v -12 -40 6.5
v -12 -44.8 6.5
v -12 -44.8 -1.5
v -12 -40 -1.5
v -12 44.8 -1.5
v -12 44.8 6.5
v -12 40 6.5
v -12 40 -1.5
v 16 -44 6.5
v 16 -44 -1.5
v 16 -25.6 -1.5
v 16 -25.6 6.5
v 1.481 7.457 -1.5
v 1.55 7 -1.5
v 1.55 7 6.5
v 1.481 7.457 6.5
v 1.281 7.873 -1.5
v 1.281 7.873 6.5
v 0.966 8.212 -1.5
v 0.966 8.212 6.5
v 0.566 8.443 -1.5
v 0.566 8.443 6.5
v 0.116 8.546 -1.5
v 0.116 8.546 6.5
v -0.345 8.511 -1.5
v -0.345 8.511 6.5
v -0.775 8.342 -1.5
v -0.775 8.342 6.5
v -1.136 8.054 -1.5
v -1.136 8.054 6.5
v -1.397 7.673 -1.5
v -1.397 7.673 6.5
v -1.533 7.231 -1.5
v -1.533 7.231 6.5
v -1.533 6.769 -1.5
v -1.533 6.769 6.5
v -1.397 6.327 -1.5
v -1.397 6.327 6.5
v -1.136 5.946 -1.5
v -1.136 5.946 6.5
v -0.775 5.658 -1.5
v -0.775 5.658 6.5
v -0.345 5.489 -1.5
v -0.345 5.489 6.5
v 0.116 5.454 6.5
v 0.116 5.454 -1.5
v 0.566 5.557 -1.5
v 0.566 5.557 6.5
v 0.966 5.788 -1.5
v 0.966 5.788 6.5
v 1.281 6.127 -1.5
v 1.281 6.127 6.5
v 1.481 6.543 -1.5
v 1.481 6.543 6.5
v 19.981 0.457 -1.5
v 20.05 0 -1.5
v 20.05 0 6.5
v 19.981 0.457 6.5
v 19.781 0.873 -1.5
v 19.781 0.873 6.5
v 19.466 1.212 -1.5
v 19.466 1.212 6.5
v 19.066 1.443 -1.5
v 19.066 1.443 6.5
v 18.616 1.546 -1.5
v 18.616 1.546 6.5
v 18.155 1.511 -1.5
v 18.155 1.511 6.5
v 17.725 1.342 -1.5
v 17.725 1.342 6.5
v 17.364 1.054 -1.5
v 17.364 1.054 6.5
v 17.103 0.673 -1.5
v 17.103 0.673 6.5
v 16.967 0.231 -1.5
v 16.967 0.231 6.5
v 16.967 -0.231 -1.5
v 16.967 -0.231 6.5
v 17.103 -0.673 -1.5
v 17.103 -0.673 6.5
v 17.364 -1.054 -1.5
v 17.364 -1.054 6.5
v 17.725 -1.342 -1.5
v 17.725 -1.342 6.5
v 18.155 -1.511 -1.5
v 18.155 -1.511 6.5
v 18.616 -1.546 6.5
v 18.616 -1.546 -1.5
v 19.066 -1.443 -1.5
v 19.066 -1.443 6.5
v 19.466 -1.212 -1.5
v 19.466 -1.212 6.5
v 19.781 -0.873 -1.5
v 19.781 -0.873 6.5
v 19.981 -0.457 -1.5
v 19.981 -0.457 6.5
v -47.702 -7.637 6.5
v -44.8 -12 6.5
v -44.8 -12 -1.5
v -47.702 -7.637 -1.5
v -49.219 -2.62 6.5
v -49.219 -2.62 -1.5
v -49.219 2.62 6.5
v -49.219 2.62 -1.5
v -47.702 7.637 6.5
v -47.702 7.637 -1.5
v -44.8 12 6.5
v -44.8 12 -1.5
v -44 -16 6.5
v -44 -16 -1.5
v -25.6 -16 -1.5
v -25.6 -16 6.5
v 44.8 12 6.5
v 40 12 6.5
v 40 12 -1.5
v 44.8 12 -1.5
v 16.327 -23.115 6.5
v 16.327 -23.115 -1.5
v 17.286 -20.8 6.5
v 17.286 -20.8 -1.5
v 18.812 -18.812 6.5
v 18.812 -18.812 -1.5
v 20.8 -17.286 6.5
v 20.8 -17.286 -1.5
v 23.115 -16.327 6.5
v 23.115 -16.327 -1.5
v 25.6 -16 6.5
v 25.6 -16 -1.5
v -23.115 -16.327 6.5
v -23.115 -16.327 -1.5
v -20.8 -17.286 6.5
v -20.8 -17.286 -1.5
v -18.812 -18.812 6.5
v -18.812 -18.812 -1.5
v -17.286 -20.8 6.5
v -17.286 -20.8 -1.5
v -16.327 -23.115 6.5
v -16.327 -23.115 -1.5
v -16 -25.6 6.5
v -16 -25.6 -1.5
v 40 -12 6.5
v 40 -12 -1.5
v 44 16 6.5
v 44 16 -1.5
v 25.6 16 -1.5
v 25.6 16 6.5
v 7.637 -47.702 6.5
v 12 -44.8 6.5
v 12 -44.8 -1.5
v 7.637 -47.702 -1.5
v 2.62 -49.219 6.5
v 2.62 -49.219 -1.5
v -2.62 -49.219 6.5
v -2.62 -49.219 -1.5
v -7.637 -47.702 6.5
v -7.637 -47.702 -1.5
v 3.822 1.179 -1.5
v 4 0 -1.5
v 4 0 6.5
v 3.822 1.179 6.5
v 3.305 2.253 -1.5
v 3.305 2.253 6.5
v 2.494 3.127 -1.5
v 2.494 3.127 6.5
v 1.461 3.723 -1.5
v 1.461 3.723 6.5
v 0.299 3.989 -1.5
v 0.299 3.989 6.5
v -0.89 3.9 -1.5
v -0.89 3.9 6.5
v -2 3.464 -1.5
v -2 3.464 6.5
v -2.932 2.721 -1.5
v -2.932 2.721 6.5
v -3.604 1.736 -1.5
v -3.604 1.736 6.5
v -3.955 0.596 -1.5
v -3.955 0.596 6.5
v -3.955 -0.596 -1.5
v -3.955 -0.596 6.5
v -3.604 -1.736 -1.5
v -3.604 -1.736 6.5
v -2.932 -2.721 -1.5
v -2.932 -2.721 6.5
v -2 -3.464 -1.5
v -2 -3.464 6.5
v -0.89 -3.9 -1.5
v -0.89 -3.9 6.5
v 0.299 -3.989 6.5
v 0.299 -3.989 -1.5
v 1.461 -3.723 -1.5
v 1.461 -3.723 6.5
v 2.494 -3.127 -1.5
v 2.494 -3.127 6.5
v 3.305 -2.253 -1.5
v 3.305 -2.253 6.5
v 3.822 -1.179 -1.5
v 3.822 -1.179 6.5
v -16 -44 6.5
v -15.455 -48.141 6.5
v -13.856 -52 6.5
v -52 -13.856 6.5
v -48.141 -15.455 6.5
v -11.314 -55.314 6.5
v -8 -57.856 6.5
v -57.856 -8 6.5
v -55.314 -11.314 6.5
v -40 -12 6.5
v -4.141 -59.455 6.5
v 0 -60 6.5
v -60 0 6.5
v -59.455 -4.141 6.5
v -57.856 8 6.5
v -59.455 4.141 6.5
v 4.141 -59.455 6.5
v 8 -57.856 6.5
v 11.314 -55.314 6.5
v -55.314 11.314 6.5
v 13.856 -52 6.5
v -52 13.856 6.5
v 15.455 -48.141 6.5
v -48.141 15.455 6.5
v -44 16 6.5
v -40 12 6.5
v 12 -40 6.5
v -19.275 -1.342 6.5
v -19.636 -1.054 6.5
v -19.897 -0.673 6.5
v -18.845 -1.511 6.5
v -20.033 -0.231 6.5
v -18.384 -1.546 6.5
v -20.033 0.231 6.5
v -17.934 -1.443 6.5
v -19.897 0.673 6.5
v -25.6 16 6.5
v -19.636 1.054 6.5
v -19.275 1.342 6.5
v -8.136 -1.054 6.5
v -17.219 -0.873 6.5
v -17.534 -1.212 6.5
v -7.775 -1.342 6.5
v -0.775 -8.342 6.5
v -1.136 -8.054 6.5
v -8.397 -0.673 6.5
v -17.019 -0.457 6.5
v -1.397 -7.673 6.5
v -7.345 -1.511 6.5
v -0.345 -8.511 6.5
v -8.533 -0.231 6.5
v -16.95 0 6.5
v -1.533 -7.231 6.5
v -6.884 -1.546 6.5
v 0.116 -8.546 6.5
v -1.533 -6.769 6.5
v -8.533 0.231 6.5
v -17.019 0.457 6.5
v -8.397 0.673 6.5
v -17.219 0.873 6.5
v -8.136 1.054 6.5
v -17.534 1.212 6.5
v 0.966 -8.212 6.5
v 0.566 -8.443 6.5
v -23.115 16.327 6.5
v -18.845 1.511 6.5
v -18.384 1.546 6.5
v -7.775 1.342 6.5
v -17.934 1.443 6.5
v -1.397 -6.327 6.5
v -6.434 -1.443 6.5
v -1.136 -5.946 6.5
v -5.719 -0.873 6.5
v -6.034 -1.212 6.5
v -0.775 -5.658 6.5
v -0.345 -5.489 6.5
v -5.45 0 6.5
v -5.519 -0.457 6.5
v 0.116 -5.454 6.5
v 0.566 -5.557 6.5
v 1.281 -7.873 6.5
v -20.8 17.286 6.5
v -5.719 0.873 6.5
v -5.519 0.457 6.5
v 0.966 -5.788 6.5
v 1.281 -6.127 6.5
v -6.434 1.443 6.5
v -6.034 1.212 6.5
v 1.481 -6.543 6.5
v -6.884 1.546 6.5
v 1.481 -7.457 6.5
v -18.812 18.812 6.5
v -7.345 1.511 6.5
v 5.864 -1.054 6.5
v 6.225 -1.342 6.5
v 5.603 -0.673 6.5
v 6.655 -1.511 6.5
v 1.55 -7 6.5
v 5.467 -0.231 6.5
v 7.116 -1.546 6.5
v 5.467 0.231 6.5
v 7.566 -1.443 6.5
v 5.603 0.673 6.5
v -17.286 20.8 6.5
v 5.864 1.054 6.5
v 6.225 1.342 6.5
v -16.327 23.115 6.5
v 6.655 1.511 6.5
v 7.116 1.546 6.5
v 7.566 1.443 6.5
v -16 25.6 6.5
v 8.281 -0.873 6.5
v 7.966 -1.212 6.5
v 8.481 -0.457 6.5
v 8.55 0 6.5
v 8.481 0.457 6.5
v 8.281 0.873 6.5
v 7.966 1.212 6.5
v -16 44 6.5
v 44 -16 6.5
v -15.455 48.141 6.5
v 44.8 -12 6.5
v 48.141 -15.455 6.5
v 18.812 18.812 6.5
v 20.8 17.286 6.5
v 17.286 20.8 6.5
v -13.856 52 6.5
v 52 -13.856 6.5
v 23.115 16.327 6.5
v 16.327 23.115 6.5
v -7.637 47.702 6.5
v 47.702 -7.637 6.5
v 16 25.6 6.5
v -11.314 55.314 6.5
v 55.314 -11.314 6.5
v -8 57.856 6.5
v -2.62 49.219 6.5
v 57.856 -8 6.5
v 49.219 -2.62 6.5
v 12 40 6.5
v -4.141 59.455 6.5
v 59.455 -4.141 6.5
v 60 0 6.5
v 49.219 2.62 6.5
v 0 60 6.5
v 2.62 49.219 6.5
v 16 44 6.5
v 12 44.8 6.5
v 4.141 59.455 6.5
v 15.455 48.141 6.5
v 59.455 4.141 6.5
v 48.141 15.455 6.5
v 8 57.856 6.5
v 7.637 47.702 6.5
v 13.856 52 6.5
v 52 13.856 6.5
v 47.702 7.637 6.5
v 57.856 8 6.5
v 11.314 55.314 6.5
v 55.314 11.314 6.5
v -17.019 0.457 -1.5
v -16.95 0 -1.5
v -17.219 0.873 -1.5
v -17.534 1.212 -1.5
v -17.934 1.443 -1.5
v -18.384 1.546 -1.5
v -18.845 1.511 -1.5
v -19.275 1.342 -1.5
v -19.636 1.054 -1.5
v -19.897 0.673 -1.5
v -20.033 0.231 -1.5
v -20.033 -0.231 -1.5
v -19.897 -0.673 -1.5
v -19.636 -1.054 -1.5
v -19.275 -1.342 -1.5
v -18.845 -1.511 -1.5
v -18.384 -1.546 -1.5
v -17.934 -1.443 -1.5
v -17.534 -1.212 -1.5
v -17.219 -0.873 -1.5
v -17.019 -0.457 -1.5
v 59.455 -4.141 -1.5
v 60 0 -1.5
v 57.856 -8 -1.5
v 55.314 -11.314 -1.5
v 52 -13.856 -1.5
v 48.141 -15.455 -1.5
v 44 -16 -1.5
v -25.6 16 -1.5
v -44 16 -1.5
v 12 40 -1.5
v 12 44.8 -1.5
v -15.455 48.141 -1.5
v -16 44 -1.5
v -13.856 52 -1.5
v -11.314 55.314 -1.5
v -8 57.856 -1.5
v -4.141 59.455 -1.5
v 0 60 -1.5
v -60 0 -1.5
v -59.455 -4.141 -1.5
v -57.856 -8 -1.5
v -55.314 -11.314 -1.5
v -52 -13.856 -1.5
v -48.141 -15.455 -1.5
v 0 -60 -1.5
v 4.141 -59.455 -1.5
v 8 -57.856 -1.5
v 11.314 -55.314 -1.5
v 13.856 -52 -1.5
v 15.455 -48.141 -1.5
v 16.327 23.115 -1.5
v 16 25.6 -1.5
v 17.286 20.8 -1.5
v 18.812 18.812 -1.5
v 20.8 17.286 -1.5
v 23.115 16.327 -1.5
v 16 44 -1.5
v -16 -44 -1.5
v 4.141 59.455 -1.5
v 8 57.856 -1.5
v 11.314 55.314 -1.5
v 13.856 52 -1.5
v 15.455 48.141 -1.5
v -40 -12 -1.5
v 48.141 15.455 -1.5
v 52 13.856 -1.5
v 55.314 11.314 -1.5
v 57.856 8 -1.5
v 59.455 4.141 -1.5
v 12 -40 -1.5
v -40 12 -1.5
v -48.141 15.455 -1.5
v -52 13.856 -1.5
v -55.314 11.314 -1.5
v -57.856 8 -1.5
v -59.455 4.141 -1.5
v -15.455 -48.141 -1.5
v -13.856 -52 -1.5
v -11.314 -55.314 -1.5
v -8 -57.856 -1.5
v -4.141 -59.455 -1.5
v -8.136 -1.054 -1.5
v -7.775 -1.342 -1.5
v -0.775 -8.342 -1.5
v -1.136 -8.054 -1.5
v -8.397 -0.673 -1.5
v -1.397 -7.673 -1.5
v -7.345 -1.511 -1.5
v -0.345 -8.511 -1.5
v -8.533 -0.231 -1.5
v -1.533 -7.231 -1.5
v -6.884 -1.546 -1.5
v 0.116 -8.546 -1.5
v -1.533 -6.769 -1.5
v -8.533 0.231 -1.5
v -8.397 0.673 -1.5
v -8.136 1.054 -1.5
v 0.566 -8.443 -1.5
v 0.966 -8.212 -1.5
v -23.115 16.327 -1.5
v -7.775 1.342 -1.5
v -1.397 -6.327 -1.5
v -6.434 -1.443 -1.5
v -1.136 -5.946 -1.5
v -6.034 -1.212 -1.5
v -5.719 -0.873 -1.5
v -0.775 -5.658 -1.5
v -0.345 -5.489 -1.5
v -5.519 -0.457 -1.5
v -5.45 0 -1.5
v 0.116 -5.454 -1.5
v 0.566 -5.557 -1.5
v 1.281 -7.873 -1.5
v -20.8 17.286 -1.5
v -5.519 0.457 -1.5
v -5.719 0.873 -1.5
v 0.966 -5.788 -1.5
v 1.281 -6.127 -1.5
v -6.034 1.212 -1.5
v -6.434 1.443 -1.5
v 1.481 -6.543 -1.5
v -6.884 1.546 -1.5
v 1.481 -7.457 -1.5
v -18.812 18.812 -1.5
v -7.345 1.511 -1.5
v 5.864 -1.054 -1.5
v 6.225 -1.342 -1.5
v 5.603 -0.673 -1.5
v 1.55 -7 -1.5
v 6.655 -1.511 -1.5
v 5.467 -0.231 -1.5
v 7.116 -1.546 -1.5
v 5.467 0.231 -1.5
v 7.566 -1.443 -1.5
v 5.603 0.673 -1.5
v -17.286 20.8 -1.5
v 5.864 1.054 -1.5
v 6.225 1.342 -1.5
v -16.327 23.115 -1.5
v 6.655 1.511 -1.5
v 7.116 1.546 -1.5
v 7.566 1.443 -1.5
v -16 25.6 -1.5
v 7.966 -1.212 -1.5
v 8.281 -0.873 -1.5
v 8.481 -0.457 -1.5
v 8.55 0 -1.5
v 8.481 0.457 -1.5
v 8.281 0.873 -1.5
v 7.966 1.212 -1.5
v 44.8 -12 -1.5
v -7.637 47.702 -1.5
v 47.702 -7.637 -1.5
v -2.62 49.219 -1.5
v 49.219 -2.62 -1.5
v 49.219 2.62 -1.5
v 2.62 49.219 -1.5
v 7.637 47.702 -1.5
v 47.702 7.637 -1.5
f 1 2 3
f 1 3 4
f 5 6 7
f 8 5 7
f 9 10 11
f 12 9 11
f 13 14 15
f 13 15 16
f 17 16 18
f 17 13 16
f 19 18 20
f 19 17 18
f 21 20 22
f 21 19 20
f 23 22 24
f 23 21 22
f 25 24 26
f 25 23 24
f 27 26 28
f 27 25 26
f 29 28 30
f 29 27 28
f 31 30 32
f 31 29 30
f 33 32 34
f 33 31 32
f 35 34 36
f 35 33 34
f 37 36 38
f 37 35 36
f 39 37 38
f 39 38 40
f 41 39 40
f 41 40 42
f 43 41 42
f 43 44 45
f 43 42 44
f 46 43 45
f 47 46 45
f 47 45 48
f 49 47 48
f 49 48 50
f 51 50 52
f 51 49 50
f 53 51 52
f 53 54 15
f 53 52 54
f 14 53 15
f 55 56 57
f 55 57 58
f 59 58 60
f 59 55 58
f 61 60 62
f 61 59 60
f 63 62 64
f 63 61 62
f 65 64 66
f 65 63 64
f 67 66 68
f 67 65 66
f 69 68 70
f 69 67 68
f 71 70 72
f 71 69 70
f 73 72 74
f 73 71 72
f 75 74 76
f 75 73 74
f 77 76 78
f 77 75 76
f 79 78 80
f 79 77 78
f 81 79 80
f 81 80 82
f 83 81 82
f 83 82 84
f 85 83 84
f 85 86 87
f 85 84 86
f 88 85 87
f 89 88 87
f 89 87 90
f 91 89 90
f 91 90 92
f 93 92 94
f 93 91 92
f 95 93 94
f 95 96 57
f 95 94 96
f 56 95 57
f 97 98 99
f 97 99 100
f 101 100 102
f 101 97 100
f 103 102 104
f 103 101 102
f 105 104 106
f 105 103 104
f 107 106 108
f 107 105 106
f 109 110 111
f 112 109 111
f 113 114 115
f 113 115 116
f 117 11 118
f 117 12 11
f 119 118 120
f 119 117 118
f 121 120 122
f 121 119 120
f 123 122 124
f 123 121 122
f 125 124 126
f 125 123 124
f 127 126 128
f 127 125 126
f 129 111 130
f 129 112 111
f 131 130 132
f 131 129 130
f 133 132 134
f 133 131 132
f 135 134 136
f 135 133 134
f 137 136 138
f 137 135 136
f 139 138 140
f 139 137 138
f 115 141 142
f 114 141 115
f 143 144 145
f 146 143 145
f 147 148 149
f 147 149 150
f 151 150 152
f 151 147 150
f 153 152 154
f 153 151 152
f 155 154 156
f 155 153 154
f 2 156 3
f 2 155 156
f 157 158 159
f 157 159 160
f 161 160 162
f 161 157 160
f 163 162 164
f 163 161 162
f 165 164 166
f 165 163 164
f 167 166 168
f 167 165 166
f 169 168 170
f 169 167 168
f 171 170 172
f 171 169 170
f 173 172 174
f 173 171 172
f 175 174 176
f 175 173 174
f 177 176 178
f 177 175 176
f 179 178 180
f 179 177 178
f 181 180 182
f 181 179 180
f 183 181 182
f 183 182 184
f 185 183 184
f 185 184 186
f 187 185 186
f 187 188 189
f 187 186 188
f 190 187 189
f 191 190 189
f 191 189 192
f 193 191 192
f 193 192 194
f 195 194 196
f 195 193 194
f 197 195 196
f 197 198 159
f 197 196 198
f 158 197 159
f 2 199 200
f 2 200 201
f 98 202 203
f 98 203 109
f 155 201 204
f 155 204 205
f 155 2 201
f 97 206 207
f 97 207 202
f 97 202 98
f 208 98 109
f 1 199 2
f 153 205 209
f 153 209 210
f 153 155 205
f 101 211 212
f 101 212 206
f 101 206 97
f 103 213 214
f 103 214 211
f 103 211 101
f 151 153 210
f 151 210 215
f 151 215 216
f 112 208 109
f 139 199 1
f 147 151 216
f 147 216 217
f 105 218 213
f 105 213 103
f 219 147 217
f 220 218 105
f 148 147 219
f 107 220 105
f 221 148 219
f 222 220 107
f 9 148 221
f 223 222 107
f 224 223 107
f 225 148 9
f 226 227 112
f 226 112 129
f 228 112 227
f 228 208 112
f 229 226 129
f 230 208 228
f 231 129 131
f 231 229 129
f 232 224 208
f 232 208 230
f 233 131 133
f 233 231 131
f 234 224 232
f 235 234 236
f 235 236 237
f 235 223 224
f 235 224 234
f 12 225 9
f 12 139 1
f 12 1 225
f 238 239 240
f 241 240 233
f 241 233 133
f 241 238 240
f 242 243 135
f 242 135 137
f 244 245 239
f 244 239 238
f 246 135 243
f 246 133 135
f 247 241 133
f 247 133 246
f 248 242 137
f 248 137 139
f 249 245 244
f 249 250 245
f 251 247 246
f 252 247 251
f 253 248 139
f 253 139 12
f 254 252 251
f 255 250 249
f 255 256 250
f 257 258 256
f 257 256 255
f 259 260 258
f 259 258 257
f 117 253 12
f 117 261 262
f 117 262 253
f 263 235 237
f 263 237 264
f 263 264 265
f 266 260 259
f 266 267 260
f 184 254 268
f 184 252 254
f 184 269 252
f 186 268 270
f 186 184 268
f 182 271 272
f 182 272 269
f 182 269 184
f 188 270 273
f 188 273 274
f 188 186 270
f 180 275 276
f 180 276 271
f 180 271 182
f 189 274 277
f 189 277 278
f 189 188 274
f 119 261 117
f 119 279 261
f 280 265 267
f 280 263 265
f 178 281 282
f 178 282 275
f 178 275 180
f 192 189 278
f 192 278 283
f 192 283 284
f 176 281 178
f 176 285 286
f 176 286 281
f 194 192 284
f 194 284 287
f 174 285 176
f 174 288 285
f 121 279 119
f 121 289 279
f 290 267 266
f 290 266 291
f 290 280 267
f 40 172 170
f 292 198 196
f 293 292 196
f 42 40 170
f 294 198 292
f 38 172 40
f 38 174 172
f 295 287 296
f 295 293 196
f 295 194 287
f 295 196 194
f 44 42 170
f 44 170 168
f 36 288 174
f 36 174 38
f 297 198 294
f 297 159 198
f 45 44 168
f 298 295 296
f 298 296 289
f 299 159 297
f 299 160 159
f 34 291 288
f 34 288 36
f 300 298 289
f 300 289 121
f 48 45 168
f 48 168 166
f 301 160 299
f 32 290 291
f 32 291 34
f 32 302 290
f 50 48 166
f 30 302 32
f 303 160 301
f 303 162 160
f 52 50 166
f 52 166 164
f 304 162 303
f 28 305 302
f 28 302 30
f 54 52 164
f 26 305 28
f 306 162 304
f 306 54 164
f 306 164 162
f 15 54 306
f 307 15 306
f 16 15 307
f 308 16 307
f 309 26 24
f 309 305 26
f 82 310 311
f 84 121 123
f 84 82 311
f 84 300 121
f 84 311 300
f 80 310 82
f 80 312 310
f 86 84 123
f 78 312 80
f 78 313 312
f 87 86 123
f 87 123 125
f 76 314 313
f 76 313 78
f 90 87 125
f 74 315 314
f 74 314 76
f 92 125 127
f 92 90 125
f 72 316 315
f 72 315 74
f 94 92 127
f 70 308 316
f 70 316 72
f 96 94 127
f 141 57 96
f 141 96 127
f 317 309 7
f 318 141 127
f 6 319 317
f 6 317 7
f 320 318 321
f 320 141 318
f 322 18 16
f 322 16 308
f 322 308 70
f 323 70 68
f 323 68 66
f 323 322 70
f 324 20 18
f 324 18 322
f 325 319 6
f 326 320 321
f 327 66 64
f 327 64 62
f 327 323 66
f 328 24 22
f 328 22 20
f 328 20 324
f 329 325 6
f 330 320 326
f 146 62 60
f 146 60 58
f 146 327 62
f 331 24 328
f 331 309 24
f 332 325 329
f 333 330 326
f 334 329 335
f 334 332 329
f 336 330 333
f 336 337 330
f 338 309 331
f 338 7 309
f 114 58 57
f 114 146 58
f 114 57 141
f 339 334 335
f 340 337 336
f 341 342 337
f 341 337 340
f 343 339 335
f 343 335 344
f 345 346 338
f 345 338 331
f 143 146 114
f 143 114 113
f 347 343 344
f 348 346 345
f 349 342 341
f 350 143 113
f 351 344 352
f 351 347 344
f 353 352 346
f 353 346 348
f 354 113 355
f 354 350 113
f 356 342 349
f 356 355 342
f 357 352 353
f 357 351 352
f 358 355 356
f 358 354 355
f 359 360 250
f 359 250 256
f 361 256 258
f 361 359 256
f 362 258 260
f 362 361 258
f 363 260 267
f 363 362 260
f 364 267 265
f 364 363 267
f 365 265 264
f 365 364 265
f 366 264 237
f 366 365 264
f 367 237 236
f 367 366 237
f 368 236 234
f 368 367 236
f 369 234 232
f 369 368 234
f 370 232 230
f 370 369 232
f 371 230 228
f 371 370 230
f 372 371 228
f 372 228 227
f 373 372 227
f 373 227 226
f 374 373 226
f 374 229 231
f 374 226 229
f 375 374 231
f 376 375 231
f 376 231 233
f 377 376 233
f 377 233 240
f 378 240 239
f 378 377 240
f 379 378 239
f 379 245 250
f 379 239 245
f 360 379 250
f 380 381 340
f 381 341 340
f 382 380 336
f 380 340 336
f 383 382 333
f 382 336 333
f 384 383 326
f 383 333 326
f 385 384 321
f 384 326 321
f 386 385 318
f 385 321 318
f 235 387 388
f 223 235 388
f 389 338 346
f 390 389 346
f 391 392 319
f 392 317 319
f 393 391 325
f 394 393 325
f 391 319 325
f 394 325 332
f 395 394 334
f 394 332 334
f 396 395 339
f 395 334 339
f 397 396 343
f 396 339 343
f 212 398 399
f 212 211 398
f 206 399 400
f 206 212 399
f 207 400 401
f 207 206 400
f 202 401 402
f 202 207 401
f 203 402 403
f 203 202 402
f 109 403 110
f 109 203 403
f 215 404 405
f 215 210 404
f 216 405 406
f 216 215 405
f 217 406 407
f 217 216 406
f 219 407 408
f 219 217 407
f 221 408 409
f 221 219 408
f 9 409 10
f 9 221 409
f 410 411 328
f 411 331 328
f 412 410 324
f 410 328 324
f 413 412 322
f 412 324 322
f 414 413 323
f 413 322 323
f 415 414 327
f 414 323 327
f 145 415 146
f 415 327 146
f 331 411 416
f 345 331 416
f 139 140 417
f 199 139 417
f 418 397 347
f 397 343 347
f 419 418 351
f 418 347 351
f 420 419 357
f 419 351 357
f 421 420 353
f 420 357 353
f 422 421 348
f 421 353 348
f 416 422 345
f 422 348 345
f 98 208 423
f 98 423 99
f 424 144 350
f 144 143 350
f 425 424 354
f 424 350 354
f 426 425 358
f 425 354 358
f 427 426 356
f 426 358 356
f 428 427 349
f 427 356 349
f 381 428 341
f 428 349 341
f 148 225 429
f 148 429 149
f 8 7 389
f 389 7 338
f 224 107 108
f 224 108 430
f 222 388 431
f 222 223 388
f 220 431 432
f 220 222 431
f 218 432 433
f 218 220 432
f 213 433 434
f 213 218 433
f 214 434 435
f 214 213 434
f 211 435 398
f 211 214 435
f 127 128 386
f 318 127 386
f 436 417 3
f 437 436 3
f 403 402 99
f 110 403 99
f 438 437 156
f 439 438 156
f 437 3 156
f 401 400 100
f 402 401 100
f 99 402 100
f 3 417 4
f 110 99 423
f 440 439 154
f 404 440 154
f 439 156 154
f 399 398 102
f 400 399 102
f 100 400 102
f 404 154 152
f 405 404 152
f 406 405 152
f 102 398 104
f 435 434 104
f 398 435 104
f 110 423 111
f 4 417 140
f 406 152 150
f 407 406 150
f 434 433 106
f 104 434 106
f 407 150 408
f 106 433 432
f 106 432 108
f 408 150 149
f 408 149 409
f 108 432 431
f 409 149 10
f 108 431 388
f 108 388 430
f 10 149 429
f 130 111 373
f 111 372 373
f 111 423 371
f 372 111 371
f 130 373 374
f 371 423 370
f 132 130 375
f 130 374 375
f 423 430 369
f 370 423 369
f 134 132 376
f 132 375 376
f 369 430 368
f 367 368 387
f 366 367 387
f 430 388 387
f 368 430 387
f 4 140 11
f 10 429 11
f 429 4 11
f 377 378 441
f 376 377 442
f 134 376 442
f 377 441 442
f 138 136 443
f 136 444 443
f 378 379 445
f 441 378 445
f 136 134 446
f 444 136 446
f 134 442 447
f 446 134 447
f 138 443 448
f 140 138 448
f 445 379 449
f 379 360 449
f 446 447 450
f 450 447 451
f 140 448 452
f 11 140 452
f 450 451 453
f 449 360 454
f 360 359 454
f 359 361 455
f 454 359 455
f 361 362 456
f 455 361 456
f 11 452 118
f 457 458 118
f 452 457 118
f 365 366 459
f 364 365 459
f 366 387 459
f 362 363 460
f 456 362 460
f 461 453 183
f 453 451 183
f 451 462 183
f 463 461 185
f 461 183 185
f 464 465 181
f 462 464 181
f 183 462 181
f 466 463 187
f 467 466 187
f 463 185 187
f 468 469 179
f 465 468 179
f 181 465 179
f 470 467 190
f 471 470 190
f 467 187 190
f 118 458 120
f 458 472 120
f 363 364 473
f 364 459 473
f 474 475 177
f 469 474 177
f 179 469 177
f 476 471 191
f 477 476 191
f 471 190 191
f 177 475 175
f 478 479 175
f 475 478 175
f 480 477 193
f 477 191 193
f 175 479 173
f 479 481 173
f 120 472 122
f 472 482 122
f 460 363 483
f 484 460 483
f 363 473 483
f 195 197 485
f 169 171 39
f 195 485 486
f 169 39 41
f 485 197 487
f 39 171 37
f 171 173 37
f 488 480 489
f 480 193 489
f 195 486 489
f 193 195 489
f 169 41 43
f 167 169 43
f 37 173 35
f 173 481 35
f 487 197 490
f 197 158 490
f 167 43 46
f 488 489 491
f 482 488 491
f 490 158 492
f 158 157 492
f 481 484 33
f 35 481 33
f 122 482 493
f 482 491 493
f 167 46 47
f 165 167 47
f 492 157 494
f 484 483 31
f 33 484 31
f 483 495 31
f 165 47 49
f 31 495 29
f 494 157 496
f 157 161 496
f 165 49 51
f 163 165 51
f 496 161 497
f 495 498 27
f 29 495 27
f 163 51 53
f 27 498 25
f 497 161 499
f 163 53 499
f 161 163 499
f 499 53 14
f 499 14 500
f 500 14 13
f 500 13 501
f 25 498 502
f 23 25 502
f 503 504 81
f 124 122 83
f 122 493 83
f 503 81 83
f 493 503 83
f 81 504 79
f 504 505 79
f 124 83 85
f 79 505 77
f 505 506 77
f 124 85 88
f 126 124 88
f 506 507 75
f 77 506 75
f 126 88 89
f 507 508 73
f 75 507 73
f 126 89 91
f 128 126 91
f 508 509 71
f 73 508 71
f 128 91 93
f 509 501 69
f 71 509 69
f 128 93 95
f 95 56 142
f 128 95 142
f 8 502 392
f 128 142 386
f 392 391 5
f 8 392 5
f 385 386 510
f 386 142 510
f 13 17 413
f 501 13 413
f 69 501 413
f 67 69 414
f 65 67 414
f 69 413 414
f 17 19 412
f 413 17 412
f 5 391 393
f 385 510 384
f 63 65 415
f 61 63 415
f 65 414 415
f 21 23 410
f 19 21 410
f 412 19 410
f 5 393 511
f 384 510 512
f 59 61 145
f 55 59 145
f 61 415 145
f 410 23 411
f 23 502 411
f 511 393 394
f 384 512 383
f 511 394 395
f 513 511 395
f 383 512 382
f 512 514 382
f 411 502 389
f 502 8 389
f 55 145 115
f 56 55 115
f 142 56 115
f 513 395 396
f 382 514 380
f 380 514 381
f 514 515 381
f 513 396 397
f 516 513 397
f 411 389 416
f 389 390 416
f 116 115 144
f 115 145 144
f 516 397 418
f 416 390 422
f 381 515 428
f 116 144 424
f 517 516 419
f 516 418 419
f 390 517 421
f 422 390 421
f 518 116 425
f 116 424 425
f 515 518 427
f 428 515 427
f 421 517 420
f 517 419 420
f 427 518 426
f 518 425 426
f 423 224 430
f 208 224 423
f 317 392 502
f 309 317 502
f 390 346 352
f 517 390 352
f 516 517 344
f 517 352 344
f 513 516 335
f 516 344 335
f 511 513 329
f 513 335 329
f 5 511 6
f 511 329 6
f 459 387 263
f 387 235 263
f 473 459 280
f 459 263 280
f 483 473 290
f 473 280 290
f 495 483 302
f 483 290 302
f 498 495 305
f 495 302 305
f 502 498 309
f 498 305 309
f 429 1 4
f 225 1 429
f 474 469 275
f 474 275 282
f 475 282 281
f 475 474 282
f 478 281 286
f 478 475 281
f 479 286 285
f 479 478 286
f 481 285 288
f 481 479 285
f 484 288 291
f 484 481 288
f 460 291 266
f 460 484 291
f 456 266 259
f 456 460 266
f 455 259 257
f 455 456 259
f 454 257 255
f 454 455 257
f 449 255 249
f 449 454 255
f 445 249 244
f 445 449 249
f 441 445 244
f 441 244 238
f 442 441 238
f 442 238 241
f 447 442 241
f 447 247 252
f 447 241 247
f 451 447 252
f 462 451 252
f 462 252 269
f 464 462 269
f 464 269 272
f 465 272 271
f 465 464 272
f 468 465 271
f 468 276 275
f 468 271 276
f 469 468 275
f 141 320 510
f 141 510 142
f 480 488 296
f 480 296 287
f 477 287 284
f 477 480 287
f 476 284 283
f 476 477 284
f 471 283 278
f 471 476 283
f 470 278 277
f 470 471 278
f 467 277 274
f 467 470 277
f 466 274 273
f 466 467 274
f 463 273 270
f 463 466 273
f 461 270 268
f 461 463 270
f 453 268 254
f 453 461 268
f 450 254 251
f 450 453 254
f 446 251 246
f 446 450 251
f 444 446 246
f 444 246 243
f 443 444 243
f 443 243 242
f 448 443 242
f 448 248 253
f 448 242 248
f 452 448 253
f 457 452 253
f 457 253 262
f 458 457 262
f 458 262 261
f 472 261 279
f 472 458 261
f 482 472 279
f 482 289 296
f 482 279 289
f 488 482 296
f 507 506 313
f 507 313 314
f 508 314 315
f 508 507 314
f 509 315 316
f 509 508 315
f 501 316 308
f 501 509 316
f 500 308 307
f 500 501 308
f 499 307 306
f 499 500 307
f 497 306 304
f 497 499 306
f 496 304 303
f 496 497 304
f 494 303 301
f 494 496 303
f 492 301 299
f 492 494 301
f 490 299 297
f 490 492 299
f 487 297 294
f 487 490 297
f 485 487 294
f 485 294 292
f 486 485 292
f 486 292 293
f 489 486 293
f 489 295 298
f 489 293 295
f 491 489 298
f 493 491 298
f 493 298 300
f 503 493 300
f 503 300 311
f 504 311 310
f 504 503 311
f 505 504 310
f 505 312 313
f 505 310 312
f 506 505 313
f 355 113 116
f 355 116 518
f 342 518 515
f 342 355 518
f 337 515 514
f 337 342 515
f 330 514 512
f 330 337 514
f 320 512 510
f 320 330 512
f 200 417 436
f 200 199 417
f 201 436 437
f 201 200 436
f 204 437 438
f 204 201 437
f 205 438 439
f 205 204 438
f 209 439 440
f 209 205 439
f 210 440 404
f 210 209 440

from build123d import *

# Parameters (mm, degrees)
EXTRUDE_1_DEPTH          = 5
CUT_EXTRUDE_1_DEPTH      = 54.268189382
FILLET_1_R               = 10
FILLET_2_R               = 6
SCALE_1_SCALE            = 1.6
CUT_EXTRUDE_2_DEPTH      = 86.229103011
CUT_EXTRUDE_2_DEPTH_BACK = 86.229103011
SKETCH_3_R               = 4
SKETCH_3_R_2             = 1.55


with BuildPart() as part:
    # 草图1 → 凸台-拉伸1 (new body)
    with BuildSketch(Plane.XY):
        Polygon((-10, 32.5), (-10, 10), (-37.5, 10), (-37.5, -10), (-10, -10), (-10, -37.5), (10, -37.5), (10, -10), (37.5, -10), (37.5, 10), (10, 10), (10, 32.5), (10, 37.5), (0, 37.5), (-10, 37.5), align=None)
    extrude(amount=EXTRUDE_1_DEPTH)

    # 草图2 → 切除-拉伸1 (cut, through all)
    with BuildSketch(Plane.XY.offset(5)):
        with BuildLine():
            Line((7.5, 25), (7.5, 28))
            ThreePointArc((7.5, 28), (0, 30.881947343), (-7.5, 28))
            Line((-7.5, 28), (-7.5, 25))
            Line((-7.5, 25), (7.5, 25))
        make_face()
        with BuildLine():
            ThreePointArc((-28, -7.5), (-30.881947343, 0), (-28, 7.5))
            Line((-28, 7.5), (-25, 7.5))
            Line((-25, 7.5), (-25, -7.5))
            Line((-25, -7.5), (-28, -7.5))
        make_face()
        with BuildLine():
            ThreePointArc((7.5, -28), (0, -30.881947343), (-7.5, -28))
            Line((-7.5, -28), (-7.5, -25))
            Line((-7.5, -25), (7.5, -25))
            Line((7.5, -25), (7.5, -28))
        make_face()
        with BuildLine():
            ThreePointArc((28, 7.5), (30.881947343, 0), (28, -7.5))
            Line((28, -7.5), (25, -7.5))
            Line((25, -7.5), (25, 7.5))
            Line((25, 7.5), (28, 7.5))
        make_face()
    extrude(amount=-CUT_EXTRUDE_1_DEPTH, mode=Mode.SUBTRACT)

    # 圆角1
    fillet_1_edges = [part.edges().sort_by_distance(p)[0] for p in [
        (-37.5, 10, 2.5),
        (-37.5, -10, 2.5),
        (-10, -37.5, 2.5),
        (10, -37.5, 2.5),
        (37.5, -10, 2.5),
        (37.5, 10, 2.5),
        (10, 37.5, 2.5),
        (-10, 37.5, 2.5),
    ]]
    fillet(fillet_1_edges, radius=FILLET_1_R - 0.0001)  # a hair under: the kernel refuses the full size

    # 圆角2
    fillet_2_edges = [part.edges().sort_by_distance(p)[0] for p in [
        (10, 10, 2.5),
        (10, -10, 2.5),
        (-10, -10, 2.5),
        (-10, 10, 2.5),
    ]]
    fillet(fillet_2_edges, radius=FILLET_2_R)


with BuildPart() as part_1:
    # 缩放比例1: scaled about (0, 0, 2.5)
    add(part.part.scale(SCALE_1_SCALE).moved(Location((0, 0, -1.5))))

    # 草图3 → 切除-拉伸2 (cut, two sides: drawn at the far end of the back side and taken through both)
    with BuildSketch(Plane.XY.offset(6.5).offset(-CUT_EXTRUDE_2_DEPTH_BACK)):
        Circle(SKETCH_3_R)
        with Locations((-7, 0)):
            Circle(SKETCH_3_R_2)
        with Locations((7, 0)):
            Circle(SKETCH_3_R_2)
        with Locations((0, 7)):
            Circle(SKETCH_3_R_2)
        with Locations((0, -7)):
            Circle(SKETCH_3_R_2)
        with Locations((-18.5, 0)):
            Circle(SKETCH_3_R_2)
        with Locations((18.5, 0)):
            Circle(SKETCH_3_R_2)
    extrude(amount=CUT_EXTRUDE_2_DEPTH + CUT_EXTRUDE_2_DEPTH_BACK, mode=Mode.SUBTRACT)


solid = part_1.part
